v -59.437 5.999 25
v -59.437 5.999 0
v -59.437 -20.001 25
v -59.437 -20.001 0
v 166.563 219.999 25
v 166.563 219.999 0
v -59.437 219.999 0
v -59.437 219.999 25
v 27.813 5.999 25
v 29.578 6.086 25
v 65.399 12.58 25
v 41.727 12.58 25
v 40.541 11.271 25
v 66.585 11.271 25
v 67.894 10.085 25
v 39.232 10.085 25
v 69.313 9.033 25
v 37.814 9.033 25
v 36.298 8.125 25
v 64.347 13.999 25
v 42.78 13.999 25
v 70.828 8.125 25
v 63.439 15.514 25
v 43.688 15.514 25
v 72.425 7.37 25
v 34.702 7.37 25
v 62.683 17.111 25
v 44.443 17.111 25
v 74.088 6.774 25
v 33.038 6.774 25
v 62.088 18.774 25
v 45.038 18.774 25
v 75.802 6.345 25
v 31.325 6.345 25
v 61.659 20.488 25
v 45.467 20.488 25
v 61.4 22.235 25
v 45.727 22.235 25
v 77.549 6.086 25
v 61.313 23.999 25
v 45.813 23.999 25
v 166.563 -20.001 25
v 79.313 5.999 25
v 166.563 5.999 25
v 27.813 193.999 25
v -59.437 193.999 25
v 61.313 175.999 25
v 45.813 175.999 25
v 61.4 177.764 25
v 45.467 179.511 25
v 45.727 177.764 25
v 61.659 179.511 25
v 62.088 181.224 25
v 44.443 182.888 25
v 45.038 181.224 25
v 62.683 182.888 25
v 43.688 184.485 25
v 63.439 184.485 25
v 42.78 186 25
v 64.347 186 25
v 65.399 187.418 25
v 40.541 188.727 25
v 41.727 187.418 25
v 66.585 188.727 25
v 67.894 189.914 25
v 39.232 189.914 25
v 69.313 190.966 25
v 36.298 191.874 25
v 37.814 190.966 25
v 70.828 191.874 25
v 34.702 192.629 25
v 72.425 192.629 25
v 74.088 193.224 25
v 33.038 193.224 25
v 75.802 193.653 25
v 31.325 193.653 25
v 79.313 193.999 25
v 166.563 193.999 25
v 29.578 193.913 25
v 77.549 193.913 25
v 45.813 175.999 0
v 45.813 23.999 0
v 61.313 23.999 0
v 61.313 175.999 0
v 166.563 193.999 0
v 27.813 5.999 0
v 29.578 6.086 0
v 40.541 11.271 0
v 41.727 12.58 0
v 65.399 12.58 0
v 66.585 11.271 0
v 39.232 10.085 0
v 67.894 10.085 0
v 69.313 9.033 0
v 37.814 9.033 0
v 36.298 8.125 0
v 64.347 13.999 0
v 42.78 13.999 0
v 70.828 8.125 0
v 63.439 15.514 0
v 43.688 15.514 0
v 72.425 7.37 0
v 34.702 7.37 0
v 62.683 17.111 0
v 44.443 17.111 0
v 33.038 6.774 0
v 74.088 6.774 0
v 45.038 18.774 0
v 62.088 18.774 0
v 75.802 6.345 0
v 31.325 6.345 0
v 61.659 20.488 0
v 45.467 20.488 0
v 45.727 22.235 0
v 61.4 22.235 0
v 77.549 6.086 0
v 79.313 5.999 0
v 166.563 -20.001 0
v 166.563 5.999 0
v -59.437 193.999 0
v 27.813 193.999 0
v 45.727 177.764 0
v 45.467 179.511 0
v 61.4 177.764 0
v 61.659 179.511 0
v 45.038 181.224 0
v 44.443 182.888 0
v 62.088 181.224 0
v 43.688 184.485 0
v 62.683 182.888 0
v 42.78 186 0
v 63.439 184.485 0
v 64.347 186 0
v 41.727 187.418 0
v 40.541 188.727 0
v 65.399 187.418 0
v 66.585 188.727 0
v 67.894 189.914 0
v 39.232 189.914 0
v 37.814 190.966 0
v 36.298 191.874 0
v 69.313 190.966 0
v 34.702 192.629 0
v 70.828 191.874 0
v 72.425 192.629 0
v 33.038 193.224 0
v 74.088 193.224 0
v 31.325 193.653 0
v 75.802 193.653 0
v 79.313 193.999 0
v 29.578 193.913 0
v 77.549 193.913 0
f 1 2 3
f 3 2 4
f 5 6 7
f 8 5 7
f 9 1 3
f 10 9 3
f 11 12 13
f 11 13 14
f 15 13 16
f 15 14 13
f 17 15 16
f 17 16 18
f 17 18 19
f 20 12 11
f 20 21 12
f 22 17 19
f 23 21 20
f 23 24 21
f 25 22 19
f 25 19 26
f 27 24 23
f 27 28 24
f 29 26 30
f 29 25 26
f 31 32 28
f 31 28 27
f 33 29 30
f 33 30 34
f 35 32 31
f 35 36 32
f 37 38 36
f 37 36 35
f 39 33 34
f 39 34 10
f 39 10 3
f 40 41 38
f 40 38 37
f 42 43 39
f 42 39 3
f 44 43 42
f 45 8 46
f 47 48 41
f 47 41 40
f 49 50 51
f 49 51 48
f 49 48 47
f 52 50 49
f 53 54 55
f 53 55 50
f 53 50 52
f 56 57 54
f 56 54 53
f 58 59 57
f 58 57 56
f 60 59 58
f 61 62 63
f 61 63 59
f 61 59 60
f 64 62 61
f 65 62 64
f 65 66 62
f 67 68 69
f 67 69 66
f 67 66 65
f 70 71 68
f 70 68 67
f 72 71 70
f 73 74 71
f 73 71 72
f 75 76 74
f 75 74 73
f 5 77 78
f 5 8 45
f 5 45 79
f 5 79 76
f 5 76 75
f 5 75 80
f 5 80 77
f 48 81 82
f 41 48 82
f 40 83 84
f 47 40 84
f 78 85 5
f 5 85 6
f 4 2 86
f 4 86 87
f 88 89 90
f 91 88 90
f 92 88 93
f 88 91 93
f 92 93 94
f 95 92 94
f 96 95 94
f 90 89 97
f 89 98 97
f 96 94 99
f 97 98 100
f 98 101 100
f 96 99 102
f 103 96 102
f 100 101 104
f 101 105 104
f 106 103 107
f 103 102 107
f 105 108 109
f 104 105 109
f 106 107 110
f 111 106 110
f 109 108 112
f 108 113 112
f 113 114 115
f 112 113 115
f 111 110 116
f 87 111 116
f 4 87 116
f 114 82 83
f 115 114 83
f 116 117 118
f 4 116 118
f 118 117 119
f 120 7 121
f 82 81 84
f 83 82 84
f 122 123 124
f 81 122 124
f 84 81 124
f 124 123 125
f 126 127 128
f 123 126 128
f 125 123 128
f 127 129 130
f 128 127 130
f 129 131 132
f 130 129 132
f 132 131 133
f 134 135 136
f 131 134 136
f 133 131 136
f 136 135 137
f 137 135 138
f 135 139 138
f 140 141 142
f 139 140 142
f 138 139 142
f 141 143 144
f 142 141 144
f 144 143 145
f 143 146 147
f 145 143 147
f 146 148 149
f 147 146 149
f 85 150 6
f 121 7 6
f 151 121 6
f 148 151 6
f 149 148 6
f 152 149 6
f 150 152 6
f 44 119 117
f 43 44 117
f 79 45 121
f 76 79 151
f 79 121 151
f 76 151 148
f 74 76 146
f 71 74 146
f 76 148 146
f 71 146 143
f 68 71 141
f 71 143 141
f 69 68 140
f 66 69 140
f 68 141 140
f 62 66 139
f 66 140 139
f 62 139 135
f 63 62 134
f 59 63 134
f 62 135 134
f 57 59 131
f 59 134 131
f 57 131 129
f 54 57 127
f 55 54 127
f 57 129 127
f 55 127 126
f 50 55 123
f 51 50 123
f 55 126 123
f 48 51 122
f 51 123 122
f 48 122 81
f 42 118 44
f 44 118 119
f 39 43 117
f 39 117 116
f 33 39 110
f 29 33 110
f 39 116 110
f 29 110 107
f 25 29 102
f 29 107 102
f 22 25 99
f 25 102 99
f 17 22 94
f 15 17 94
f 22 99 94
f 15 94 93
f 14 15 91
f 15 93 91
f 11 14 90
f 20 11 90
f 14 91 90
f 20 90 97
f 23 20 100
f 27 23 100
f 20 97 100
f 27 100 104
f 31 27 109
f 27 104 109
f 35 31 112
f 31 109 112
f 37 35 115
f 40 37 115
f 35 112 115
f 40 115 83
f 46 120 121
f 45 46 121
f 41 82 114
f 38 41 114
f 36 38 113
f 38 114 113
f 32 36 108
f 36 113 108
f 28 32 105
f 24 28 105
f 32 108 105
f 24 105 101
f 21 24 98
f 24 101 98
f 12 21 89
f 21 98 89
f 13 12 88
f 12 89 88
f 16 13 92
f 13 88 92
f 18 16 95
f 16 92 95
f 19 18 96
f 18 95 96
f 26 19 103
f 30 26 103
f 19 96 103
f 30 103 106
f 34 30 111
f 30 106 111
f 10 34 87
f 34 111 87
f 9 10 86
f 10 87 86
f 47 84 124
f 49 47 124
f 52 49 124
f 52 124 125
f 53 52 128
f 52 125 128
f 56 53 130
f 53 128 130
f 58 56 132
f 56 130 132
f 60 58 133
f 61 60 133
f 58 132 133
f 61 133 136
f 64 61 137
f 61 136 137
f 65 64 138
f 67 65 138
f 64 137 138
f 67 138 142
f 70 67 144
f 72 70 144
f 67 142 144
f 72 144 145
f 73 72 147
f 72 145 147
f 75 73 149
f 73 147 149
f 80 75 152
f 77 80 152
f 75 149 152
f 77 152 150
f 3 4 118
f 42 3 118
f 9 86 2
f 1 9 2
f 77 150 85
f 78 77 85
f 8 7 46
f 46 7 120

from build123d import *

# Parameters (mm, degrees)
F1_DEPTH = 25


with BuildPart() as f1:
    # F0 (on Top) → F1 (new body)
    with BuildSketch(Plane.XY):
        with BuildLine():
            ThreePointArc((27.813243, 193.999363), (40.541165, 188.727285), (45.813243, 175.999363))
            Line((45.813243, 175.999363), (45.813243, 23.999363))
            ThreePointArc((45.813243, 23.999363), (40.541165, 11.271441), (27.813243, 5.999363))
            Line((27.813243, 5.999363), (-59.436757, 5.999363))
            Line((-59.436757, 5.999363), (-59.436757, -20.000637))
            Line((-59.436757, -20.000637), (166.563243, -20.000637))
            Line((166.563243, -20.000637), (166.563243, 5.999363))
            Line((166.563243, 5.999363), (79.313243, 5.999363))
            ThreePointArc((79.313243, 5.999363), (66.585321, 11.271441), (61.313243, 23.999363))
            Line((61.313243, 23.999363), (61.313243, 175.999363))
            ThreePointArc((61.313243, 175.999363), (66.585321, 188.727285), (79.313243, 193.999363))
            Line((79.313243, 193.999363), (166.563243, 193.999363))
            Line((166.563243, 193.999363), (166.563243, 219.999363))
            Line((166.563243, 219.999363), (-59.436757, 219.999363))
            Line((-59.436757, 219.999363), (-59.436757, 193.999363))
            Line((-59.436757, 193.999363), (27.813243, 193.999363))
        make_face()
    extrude(amount=F1_DEPTH)


solid = f1.part
